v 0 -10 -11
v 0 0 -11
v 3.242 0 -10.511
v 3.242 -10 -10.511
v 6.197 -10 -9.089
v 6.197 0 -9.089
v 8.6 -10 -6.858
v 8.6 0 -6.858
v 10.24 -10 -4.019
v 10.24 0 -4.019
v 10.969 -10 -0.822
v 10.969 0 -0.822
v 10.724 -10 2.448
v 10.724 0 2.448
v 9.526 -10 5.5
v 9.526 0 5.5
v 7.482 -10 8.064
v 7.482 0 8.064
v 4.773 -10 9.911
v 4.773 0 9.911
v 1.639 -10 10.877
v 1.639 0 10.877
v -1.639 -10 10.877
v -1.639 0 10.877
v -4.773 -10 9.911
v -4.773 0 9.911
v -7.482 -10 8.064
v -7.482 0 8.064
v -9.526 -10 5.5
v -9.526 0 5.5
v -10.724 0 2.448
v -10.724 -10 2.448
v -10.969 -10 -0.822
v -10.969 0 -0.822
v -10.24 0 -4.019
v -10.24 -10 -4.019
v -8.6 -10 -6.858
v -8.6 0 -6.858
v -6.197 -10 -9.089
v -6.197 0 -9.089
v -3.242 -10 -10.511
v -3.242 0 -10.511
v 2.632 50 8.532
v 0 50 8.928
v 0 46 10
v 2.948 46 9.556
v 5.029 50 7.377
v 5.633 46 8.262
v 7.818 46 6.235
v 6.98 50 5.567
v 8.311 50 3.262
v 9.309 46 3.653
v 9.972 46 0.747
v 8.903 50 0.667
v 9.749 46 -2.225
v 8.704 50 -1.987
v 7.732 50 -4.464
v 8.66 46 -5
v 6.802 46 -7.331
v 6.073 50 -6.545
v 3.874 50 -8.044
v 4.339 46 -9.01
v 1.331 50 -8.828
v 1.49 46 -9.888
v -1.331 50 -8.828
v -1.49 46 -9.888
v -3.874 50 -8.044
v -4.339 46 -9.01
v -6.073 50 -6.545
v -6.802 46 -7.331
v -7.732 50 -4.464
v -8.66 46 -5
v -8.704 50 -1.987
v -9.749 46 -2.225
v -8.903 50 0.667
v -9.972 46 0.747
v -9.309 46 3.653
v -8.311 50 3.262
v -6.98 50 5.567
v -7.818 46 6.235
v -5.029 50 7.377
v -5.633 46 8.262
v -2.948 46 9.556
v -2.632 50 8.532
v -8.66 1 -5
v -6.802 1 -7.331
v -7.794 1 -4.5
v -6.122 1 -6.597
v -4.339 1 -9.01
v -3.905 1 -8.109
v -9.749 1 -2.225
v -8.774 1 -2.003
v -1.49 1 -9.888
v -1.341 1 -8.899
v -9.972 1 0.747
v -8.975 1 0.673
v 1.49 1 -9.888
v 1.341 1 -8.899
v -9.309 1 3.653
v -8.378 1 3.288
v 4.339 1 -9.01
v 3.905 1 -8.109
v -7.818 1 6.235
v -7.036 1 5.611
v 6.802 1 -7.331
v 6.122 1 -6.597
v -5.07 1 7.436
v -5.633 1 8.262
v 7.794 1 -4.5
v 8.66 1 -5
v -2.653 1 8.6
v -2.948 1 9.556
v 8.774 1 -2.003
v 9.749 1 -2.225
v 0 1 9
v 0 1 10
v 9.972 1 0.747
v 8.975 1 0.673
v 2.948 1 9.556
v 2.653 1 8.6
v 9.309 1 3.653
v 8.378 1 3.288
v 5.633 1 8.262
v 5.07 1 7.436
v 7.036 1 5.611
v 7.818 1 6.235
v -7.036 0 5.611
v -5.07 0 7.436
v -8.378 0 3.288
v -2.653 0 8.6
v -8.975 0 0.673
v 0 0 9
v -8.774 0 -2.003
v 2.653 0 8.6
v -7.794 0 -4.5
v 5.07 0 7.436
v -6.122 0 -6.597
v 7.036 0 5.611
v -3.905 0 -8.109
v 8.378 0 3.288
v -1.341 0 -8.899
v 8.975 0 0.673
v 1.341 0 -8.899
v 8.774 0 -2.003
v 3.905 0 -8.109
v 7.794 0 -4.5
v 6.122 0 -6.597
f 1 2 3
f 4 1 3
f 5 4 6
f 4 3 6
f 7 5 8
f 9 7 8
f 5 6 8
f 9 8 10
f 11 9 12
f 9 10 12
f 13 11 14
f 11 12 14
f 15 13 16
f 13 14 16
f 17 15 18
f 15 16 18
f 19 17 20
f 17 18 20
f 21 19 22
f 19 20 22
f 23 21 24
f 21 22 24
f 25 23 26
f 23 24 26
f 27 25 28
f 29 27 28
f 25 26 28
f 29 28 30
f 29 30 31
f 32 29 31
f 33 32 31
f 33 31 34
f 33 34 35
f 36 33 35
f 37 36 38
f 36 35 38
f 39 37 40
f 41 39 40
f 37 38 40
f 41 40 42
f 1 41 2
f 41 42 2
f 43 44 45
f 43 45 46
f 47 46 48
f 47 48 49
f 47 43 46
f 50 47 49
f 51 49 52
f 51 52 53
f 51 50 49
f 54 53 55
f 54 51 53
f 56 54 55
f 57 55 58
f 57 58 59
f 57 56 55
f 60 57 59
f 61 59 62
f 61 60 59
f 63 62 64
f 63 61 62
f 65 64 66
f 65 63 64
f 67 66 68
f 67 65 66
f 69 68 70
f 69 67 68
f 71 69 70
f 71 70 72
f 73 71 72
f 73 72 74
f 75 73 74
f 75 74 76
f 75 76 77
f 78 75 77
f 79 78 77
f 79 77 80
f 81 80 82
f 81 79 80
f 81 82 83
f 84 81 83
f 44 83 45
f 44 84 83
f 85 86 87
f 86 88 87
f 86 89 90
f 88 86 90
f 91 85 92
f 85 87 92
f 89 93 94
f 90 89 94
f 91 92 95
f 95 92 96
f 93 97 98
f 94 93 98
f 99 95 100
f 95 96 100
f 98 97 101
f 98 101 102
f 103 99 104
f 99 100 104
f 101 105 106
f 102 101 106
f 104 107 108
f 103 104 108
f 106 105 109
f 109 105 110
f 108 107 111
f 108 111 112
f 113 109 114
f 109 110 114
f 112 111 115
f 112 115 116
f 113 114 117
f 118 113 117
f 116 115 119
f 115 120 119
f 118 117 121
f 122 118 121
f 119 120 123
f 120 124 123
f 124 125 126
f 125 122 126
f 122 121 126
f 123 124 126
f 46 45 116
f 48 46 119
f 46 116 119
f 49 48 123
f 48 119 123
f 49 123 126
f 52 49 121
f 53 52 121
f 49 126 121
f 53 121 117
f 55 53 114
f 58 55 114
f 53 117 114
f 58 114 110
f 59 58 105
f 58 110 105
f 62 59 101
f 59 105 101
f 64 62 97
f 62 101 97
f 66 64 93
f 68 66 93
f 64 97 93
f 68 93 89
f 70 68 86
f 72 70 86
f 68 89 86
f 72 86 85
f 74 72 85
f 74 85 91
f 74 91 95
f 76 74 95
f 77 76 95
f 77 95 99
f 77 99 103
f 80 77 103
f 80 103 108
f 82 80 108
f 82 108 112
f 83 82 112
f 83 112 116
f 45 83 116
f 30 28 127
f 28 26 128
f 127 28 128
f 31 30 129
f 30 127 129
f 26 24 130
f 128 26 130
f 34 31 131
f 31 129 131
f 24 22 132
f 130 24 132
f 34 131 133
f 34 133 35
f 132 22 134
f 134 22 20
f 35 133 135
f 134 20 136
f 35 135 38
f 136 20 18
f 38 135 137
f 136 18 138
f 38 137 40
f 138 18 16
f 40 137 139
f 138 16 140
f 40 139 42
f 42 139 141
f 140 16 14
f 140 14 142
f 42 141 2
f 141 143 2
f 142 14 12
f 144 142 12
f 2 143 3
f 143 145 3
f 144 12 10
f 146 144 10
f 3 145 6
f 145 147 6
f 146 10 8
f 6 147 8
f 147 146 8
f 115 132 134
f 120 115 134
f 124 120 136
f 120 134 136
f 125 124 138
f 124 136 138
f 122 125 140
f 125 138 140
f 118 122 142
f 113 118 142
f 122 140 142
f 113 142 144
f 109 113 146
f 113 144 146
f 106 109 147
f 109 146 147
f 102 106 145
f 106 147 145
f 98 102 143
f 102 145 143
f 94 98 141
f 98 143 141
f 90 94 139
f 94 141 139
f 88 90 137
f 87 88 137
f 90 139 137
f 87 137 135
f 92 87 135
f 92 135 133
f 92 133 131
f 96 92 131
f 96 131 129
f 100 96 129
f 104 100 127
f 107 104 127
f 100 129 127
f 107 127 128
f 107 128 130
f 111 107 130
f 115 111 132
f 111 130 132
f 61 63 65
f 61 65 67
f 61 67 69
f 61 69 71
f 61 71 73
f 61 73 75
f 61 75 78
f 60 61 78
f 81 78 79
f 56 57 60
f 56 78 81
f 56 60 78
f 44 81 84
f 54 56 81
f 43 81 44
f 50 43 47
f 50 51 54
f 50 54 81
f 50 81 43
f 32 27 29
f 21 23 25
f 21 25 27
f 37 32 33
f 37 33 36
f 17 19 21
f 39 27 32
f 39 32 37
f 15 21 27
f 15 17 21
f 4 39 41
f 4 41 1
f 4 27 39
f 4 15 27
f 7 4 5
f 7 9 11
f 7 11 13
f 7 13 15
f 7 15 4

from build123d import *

# Parameters (mm, degrees)
SKETCH_1_R          = 10
EXTRUDE_1_DEPTH     = 50
SKETCH_2_R          = 11
EXTRUDE_2_DEPTH     = 10
CHAMFER_1_SIZE      = 4
CHAMFER_1_SIZE2     = 1.07179677
SKETCH_3_R          = 10
SKETCH_3_R_2        = 9
CUT_EXTRUDE_1_DEPTH = 1


with BuildPart() as part:
    # Эскиз1 → Бобышка-Вытянуть1 (new body)
    with BuildSketch(Plane(origin=(0, 0, 0), x_dir=(1, 0, 0), z_dir=(0, 1, 0))):
        with Locations(Location((0, 0, 0), (0, 0, 270))):
            Circle(SKETCH_1_R)
    extrude(amount=EXTRUDE_1_DEPTH)

    # Эскиз2 → Бобышка-Вытянуть2 (add)
    with BuildSketch(Plane.XZ):
        with Locations(Location((0, 0, 0), (0, 0, 270))):
            Circle(SKETCH_2_R)
    extrude(amount=EXTRUDE_2_DEPTH)

    # Фаска1
    chamfer_1_edges = [part.edges().sort_by_distance(p)[0] for p in [
        (0, 50, -10),
    ]]
    chamfer_1_side = [part.faces().sort_by_distance(p)[0] for p in [
        (0, 25, -10),
    ]]
    chamfer(chamfer_1_edges, length=CHAMFER_1_SIZE, length2=CHAMFER_1_SIZE2, reference=chamfer_1_side[0])

    # Эскиз3 → Вырез-Вытянуть1 (cut)
    with BuildSketch(Plane(origin=(0, 0, 0), x_dir=(1, 0, 0), z_dir=(0, 1, 0))):
        with Locations(Location((0, 0, 0), (0, 0, 270))):
            Circle(SKETCH_3_R)
        with Locations(Location((0, 0, 0), (0, 0, 270))):
            Circle(SKETCH_3_R_2, mode=Mode.SUBTRACT)
    extrude(amount=CUT_EXTRUDE_1_DEPTH, mode=Mode.SUBTRACT)


solid = part.part
